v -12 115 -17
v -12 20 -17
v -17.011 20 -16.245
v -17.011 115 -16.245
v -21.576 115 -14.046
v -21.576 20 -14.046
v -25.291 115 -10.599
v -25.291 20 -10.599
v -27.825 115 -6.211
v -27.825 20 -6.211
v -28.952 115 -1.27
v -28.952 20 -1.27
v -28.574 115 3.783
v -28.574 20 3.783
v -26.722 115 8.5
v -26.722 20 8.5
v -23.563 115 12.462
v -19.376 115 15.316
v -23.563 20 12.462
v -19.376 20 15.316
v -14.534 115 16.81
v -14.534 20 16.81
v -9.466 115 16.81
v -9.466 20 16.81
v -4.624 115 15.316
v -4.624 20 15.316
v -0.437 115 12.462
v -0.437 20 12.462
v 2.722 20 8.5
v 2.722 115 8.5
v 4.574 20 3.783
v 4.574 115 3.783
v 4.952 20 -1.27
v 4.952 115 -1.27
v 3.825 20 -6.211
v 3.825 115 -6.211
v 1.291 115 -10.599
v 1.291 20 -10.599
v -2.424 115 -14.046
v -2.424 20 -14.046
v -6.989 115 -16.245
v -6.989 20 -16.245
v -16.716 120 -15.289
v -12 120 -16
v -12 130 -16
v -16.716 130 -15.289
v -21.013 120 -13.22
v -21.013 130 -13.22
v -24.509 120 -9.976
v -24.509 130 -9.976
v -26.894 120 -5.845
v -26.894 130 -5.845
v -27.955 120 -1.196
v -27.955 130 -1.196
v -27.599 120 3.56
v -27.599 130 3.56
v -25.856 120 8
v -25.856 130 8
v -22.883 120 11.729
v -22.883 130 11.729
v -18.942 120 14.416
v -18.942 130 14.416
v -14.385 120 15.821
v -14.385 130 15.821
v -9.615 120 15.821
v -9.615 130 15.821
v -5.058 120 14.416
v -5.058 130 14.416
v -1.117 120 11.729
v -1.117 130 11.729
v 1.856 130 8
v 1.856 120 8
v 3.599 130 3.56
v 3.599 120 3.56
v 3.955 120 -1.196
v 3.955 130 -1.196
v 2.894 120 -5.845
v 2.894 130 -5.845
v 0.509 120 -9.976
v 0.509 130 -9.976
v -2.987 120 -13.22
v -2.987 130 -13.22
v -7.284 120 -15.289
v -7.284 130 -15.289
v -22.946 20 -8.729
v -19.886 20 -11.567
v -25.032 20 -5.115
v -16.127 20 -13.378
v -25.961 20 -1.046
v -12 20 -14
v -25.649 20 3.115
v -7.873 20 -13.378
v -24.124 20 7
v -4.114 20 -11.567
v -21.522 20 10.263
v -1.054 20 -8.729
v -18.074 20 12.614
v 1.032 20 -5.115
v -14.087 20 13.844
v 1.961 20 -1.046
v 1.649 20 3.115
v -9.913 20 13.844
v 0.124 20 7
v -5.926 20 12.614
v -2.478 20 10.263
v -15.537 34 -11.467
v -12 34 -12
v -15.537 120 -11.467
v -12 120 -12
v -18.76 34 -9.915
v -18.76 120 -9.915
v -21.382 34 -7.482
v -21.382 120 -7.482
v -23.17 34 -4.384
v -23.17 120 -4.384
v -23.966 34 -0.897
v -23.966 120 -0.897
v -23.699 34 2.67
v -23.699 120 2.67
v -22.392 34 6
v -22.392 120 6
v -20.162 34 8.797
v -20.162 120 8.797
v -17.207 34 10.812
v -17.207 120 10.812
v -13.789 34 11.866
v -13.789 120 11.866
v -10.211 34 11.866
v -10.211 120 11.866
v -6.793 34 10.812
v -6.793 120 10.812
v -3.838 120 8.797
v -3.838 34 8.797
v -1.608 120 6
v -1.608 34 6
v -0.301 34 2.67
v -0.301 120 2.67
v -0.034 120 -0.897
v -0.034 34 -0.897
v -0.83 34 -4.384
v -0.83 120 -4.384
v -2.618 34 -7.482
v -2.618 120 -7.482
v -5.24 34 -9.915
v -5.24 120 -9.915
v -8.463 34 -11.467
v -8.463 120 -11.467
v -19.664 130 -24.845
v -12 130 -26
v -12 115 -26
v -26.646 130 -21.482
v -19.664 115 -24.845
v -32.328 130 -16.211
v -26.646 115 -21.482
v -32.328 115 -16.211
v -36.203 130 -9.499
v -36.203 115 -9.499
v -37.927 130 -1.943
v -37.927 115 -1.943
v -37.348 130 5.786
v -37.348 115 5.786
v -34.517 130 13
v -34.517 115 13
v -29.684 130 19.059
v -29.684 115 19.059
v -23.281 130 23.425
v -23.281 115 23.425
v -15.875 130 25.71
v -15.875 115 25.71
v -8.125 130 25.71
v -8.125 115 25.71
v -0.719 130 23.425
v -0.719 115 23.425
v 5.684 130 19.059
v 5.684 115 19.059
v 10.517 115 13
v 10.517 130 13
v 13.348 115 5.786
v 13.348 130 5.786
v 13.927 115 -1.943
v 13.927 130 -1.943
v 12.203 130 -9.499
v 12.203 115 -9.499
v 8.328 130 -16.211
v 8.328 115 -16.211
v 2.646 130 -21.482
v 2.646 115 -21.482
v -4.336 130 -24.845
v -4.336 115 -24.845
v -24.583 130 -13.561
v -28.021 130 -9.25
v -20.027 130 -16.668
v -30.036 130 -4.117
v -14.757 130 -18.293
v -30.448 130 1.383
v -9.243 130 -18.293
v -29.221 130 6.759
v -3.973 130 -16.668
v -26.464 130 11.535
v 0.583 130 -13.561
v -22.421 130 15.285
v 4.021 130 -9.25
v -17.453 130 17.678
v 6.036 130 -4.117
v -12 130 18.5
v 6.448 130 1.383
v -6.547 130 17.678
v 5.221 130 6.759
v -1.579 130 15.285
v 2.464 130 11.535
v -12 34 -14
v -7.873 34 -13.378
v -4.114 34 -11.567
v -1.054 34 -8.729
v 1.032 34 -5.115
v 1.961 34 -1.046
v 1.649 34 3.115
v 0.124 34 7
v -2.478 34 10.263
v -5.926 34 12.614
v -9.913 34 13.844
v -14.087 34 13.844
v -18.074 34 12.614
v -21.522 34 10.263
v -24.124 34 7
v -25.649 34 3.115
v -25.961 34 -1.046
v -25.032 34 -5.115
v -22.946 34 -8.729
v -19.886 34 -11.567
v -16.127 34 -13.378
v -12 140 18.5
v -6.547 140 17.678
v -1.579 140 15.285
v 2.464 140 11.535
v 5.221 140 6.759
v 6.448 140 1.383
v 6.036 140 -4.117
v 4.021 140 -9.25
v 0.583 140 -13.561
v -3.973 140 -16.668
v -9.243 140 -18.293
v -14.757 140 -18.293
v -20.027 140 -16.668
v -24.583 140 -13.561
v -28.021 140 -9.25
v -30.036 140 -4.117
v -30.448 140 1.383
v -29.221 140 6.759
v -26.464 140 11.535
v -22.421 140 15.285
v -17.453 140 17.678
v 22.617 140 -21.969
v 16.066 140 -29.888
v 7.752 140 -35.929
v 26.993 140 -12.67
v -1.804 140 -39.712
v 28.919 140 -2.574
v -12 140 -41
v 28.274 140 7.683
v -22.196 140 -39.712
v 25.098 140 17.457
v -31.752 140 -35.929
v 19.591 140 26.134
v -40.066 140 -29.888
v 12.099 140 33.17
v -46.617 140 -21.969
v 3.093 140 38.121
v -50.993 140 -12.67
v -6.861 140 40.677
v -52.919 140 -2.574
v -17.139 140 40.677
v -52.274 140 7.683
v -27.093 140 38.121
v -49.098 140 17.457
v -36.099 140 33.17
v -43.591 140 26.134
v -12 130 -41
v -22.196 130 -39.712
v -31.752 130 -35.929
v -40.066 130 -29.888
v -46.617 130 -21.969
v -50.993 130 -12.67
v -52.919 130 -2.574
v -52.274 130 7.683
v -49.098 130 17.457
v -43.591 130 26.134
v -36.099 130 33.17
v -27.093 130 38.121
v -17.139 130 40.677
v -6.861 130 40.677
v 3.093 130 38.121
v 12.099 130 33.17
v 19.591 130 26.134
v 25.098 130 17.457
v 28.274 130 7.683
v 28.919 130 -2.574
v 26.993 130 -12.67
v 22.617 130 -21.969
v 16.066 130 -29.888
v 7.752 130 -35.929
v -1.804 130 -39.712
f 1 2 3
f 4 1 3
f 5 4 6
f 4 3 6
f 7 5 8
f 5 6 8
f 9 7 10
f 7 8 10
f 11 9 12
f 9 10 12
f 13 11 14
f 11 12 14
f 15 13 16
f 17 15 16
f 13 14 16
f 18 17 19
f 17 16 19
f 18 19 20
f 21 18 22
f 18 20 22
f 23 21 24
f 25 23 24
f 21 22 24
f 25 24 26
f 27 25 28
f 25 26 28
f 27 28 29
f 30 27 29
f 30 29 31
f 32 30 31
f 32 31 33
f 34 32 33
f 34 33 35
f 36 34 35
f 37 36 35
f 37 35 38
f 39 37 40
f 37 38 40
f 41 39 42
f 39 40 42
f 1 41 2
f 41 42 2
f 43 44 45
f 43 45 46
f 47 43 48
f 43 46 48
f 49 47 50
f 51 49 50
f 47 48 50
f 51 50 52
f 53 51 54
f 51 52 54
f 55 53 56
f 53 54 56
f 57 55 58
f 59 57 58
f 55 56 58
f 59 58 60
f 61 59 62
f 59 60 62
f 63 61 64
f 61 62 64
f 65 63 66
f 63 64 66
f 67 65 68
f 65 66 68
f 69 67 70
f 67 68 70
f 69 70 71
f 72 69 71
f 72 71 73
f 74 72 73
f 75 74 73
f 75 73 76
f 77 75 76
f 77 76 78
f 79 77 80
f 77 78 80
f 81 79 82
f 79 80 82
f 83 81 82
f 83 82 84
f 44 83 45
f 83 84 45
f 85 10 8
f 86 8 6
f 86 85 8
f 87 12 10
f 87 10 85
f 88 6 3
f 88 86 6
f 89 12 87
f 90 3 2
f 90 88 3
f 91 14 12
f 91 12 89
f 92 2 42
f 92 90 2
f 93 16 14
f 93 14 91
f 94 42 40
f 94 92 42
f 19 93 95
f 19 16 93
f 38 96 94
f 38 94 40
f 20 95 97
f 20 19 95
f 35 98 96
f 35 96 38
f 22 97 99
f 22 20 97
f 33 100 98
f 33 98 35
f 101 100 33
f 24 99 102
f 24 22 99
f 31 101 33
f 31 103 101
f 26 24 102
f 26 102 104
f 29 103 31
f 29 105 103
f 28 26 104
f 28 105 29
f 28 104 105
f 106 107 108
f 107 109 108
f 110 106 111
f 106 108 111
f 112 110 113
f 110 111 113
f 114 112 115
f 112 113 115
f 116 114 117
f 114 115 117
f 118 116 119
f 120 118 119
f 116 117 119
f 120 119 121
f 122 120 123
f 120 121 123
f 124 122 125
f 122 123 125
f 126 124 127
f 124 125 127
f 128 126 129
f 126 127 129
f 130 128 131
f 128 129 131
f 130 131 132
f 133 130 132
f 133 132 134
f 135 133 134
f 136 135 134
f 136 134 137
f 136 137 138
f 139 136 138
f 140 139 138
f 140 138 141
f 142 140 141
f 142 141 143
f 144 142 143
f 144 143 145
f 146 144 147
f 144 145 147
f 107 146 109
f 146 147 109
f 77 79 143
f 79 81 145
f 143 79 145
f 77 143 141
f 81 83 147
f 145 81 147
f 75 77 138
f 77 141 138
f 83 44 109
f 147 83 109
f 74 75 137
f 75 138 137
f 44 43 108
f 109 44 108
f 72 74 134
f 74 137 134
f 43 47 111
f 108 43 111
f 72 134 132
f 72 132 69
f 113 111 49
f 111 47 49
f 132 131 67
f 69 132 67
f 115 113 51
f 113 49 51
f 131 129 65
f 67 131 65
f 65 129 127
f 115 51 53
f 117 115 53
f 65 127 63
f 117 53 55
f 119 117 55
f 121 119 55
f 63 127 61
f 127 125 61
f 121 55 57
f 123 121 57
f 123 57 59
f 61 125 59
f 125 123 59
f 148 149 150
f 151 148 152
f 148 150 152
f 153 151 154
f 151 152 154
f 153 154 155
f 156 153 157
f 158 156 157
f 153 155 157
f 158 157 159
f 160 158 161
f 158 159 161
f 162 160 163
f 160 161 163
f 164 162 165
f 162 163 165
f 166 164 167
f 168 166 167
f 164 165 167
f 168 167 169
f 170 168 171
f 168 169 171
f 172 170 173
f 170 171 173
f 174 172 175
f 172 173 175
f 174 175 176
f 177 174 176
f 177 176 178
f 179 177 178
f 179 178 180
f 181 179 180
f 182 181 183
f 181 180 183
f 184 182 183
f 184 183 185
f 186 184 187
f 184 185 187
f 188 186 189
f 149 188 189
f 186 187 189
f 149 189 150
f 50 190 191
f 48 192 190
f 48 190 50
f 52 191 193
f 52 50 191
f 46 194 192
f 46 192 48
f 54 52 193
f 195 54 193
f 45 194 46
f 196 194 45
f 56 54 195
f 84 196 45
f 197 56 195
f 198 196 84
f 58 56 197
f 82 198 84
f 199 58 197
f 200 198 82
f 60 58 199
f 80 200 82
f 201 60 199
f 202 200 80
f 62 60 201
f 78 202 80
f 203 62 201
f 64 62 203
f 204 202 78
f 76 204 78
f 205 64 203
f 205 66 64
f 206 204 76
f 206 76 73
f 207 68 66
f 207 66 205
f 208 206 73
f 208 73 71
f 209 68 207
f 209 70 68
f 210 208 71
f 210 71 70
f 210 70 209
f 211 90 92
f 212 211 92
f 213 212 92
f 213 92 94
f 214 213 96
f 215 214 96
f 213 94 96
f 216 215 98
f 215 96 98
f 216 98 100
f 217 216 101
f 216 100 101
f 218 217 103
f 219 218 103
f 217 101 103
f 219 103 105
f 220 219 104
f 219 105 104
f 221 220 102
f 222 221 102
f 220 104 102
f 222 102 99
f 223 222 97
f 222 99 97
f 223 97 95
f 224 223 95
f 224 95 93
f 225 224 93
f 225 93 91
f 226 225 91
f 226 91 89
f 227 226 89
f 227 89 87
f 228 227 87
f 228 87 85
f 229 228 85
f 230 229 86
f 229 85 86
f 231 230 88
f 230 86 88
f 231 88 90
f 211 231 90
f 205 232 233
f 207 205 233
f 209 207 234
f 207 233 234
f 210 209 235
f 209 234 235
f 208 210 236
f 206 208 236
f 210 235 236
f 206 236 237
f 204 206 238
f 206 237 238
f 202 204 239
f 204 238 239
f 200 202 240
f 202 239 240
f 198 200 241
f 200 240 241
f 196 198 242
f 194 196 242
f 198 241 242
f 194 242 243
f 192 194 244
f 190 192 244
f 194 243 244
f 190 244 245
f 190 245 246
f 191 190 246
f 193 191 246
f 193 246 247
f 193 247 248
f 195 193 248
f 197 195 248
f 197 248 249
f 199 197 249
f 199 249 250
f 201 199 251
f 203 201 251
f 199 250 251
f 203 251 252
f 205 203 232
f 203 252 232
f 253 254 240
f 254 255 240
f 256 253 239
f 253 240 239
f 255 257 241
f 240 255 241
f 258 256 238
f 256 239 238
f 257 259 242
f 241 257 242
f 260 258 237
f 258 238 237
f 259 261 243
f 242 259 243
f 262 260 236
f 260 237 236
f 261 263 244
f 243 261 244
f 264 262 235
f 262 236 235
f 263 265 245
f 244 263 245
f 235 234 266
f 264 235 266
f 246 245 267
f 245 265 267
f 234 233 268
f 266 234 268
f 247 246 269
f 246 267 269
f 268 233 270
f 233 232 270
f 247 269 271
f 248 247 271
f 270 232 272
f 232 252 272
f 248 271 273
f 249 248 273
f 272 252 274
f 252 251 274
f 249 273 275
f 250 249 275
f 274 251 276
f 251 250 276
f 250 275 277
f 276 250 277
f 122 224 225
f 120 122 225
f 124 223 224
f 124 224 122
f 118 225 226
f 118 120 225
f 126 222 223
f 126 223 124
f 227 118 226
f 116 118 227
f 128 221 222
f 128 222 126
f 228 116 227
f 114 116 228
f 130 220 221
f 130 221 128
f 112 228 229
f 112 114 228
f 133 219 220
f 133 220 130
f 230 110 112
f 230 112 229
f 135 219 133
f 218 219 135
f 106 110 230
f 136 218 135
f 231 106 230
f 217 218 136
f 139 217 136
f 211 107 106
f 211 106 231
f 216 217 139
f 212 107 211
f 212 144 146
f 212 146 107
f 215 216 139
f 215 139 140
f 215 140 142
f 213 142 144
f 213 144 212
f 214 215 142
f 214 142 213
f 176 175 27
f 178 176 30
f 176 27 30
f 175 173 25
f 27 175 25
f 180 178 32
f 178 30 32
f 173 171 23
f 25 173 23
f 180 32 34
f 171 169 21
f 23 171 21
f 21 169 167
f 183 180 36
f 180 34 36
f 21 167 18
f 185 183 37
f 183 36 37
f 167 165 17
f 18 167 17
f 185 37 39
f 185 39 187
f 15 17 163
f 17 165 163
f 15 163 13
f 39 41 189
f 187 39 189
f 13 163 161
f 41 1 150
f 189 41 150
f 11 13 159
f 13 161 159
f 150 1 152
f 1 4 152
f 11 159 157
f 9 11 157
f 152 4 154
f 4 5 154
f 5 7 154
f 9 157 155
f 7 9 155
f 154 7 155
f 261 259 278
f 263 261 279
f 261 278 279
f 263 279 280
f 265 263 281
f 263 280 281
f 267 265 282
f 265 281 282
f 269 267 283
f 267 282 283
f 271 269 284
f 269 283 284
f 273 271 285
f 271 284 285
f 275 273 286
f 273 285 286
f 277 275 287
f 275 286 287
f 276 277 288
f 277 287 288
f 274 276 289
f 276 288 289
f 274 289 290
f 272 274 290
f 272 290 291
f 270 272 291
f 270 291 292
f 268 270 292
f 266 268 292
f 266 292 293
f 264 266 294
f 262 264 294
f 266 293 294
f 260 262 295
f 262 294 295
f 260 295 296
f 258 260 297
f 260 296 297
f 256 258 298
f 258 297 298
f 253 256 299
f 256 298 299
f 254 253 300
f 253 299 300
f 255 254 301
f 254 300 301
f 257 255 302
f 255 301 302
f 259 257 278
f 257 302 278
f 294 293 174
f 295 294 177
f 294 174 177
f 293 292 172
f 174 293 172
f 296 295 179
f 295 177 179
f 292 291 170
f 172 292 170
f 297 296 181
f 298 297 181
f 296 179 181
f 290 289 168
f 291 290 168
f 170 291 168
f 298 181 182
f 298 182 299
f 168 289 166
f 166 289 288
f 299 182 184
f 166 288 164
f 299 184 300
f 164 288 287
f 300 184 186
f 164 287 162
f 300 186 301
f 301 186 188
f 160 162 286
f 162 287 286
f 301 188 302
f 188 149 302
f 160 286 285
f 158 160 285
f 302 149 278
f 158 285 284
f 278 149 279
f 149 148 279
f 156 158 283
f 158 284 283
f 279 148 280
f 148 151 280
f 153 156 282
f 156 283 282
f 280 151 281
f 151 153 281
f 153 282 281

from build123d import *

# Parameters (mm, degrees)
SKETCH3_R      = 18.5
EXTRUDE1_DEPTH = 20
SKETCH4_R      = 14
EXTRUDE2_DEPTH = 14
SKETCH5_R      = 18.5
EXTRUDE3_DEPTH = 10


with BuildPart() as part:
    # Sketch2 → Revolve1 (revolve)
    with BuildSketch(Plane.XY, mode=Mode.PRIVATE) as revolve1_sk:
        Polygon((0, 0), (0, 120), (4, 120), (4, 140), (29, 140), (29, 130), (14, 130), (14, 115), (5, 115), (5, 0), align=None)
    revolve(revolve1_sk.sketch.rotate(Axis((-12, -9.379740318, 0), (0, 1, 0)), 90), axis=Axis((-12, -9.379740318, 0), (0, 1, 0)))

    # Sketch3 → Extrude1 (cut)
    with BuildSketch(Plane.XZ):
        with Locations((-12, 0)):
            Circle(SKETCH3_R)
    extrude(amount=-EXTRUDE1_DEPTH, mode=Mode.SUBTRACT)

    # Sketch4 → Extrude2 (cut)
    with BuildSketch(Plane.XZ.offset(-20)):
        with Locations(Location((-12, 0, 0), (0, 0, 270))):
            Circle(SKETCH4_R)
    extrude(amount=-EXTRUDE2_DEPTH, mode=Mode.SUBTRACT)

    # Sketch5 → Extrude3 (cut)
    with BuildSketch(Plane(origin=(0, 140, 0), x_dir=(1, 0, 0), z_dir=(0, 1, 0))):
        with Locations(Location((-12, 0, 0), (0, 0, 270))):
            Circle(SKETCH5_R)
    extrude(amount=-EXTRUDE3_DEPTH, mode=Mode.SUBTRACT)


solid = part.part
